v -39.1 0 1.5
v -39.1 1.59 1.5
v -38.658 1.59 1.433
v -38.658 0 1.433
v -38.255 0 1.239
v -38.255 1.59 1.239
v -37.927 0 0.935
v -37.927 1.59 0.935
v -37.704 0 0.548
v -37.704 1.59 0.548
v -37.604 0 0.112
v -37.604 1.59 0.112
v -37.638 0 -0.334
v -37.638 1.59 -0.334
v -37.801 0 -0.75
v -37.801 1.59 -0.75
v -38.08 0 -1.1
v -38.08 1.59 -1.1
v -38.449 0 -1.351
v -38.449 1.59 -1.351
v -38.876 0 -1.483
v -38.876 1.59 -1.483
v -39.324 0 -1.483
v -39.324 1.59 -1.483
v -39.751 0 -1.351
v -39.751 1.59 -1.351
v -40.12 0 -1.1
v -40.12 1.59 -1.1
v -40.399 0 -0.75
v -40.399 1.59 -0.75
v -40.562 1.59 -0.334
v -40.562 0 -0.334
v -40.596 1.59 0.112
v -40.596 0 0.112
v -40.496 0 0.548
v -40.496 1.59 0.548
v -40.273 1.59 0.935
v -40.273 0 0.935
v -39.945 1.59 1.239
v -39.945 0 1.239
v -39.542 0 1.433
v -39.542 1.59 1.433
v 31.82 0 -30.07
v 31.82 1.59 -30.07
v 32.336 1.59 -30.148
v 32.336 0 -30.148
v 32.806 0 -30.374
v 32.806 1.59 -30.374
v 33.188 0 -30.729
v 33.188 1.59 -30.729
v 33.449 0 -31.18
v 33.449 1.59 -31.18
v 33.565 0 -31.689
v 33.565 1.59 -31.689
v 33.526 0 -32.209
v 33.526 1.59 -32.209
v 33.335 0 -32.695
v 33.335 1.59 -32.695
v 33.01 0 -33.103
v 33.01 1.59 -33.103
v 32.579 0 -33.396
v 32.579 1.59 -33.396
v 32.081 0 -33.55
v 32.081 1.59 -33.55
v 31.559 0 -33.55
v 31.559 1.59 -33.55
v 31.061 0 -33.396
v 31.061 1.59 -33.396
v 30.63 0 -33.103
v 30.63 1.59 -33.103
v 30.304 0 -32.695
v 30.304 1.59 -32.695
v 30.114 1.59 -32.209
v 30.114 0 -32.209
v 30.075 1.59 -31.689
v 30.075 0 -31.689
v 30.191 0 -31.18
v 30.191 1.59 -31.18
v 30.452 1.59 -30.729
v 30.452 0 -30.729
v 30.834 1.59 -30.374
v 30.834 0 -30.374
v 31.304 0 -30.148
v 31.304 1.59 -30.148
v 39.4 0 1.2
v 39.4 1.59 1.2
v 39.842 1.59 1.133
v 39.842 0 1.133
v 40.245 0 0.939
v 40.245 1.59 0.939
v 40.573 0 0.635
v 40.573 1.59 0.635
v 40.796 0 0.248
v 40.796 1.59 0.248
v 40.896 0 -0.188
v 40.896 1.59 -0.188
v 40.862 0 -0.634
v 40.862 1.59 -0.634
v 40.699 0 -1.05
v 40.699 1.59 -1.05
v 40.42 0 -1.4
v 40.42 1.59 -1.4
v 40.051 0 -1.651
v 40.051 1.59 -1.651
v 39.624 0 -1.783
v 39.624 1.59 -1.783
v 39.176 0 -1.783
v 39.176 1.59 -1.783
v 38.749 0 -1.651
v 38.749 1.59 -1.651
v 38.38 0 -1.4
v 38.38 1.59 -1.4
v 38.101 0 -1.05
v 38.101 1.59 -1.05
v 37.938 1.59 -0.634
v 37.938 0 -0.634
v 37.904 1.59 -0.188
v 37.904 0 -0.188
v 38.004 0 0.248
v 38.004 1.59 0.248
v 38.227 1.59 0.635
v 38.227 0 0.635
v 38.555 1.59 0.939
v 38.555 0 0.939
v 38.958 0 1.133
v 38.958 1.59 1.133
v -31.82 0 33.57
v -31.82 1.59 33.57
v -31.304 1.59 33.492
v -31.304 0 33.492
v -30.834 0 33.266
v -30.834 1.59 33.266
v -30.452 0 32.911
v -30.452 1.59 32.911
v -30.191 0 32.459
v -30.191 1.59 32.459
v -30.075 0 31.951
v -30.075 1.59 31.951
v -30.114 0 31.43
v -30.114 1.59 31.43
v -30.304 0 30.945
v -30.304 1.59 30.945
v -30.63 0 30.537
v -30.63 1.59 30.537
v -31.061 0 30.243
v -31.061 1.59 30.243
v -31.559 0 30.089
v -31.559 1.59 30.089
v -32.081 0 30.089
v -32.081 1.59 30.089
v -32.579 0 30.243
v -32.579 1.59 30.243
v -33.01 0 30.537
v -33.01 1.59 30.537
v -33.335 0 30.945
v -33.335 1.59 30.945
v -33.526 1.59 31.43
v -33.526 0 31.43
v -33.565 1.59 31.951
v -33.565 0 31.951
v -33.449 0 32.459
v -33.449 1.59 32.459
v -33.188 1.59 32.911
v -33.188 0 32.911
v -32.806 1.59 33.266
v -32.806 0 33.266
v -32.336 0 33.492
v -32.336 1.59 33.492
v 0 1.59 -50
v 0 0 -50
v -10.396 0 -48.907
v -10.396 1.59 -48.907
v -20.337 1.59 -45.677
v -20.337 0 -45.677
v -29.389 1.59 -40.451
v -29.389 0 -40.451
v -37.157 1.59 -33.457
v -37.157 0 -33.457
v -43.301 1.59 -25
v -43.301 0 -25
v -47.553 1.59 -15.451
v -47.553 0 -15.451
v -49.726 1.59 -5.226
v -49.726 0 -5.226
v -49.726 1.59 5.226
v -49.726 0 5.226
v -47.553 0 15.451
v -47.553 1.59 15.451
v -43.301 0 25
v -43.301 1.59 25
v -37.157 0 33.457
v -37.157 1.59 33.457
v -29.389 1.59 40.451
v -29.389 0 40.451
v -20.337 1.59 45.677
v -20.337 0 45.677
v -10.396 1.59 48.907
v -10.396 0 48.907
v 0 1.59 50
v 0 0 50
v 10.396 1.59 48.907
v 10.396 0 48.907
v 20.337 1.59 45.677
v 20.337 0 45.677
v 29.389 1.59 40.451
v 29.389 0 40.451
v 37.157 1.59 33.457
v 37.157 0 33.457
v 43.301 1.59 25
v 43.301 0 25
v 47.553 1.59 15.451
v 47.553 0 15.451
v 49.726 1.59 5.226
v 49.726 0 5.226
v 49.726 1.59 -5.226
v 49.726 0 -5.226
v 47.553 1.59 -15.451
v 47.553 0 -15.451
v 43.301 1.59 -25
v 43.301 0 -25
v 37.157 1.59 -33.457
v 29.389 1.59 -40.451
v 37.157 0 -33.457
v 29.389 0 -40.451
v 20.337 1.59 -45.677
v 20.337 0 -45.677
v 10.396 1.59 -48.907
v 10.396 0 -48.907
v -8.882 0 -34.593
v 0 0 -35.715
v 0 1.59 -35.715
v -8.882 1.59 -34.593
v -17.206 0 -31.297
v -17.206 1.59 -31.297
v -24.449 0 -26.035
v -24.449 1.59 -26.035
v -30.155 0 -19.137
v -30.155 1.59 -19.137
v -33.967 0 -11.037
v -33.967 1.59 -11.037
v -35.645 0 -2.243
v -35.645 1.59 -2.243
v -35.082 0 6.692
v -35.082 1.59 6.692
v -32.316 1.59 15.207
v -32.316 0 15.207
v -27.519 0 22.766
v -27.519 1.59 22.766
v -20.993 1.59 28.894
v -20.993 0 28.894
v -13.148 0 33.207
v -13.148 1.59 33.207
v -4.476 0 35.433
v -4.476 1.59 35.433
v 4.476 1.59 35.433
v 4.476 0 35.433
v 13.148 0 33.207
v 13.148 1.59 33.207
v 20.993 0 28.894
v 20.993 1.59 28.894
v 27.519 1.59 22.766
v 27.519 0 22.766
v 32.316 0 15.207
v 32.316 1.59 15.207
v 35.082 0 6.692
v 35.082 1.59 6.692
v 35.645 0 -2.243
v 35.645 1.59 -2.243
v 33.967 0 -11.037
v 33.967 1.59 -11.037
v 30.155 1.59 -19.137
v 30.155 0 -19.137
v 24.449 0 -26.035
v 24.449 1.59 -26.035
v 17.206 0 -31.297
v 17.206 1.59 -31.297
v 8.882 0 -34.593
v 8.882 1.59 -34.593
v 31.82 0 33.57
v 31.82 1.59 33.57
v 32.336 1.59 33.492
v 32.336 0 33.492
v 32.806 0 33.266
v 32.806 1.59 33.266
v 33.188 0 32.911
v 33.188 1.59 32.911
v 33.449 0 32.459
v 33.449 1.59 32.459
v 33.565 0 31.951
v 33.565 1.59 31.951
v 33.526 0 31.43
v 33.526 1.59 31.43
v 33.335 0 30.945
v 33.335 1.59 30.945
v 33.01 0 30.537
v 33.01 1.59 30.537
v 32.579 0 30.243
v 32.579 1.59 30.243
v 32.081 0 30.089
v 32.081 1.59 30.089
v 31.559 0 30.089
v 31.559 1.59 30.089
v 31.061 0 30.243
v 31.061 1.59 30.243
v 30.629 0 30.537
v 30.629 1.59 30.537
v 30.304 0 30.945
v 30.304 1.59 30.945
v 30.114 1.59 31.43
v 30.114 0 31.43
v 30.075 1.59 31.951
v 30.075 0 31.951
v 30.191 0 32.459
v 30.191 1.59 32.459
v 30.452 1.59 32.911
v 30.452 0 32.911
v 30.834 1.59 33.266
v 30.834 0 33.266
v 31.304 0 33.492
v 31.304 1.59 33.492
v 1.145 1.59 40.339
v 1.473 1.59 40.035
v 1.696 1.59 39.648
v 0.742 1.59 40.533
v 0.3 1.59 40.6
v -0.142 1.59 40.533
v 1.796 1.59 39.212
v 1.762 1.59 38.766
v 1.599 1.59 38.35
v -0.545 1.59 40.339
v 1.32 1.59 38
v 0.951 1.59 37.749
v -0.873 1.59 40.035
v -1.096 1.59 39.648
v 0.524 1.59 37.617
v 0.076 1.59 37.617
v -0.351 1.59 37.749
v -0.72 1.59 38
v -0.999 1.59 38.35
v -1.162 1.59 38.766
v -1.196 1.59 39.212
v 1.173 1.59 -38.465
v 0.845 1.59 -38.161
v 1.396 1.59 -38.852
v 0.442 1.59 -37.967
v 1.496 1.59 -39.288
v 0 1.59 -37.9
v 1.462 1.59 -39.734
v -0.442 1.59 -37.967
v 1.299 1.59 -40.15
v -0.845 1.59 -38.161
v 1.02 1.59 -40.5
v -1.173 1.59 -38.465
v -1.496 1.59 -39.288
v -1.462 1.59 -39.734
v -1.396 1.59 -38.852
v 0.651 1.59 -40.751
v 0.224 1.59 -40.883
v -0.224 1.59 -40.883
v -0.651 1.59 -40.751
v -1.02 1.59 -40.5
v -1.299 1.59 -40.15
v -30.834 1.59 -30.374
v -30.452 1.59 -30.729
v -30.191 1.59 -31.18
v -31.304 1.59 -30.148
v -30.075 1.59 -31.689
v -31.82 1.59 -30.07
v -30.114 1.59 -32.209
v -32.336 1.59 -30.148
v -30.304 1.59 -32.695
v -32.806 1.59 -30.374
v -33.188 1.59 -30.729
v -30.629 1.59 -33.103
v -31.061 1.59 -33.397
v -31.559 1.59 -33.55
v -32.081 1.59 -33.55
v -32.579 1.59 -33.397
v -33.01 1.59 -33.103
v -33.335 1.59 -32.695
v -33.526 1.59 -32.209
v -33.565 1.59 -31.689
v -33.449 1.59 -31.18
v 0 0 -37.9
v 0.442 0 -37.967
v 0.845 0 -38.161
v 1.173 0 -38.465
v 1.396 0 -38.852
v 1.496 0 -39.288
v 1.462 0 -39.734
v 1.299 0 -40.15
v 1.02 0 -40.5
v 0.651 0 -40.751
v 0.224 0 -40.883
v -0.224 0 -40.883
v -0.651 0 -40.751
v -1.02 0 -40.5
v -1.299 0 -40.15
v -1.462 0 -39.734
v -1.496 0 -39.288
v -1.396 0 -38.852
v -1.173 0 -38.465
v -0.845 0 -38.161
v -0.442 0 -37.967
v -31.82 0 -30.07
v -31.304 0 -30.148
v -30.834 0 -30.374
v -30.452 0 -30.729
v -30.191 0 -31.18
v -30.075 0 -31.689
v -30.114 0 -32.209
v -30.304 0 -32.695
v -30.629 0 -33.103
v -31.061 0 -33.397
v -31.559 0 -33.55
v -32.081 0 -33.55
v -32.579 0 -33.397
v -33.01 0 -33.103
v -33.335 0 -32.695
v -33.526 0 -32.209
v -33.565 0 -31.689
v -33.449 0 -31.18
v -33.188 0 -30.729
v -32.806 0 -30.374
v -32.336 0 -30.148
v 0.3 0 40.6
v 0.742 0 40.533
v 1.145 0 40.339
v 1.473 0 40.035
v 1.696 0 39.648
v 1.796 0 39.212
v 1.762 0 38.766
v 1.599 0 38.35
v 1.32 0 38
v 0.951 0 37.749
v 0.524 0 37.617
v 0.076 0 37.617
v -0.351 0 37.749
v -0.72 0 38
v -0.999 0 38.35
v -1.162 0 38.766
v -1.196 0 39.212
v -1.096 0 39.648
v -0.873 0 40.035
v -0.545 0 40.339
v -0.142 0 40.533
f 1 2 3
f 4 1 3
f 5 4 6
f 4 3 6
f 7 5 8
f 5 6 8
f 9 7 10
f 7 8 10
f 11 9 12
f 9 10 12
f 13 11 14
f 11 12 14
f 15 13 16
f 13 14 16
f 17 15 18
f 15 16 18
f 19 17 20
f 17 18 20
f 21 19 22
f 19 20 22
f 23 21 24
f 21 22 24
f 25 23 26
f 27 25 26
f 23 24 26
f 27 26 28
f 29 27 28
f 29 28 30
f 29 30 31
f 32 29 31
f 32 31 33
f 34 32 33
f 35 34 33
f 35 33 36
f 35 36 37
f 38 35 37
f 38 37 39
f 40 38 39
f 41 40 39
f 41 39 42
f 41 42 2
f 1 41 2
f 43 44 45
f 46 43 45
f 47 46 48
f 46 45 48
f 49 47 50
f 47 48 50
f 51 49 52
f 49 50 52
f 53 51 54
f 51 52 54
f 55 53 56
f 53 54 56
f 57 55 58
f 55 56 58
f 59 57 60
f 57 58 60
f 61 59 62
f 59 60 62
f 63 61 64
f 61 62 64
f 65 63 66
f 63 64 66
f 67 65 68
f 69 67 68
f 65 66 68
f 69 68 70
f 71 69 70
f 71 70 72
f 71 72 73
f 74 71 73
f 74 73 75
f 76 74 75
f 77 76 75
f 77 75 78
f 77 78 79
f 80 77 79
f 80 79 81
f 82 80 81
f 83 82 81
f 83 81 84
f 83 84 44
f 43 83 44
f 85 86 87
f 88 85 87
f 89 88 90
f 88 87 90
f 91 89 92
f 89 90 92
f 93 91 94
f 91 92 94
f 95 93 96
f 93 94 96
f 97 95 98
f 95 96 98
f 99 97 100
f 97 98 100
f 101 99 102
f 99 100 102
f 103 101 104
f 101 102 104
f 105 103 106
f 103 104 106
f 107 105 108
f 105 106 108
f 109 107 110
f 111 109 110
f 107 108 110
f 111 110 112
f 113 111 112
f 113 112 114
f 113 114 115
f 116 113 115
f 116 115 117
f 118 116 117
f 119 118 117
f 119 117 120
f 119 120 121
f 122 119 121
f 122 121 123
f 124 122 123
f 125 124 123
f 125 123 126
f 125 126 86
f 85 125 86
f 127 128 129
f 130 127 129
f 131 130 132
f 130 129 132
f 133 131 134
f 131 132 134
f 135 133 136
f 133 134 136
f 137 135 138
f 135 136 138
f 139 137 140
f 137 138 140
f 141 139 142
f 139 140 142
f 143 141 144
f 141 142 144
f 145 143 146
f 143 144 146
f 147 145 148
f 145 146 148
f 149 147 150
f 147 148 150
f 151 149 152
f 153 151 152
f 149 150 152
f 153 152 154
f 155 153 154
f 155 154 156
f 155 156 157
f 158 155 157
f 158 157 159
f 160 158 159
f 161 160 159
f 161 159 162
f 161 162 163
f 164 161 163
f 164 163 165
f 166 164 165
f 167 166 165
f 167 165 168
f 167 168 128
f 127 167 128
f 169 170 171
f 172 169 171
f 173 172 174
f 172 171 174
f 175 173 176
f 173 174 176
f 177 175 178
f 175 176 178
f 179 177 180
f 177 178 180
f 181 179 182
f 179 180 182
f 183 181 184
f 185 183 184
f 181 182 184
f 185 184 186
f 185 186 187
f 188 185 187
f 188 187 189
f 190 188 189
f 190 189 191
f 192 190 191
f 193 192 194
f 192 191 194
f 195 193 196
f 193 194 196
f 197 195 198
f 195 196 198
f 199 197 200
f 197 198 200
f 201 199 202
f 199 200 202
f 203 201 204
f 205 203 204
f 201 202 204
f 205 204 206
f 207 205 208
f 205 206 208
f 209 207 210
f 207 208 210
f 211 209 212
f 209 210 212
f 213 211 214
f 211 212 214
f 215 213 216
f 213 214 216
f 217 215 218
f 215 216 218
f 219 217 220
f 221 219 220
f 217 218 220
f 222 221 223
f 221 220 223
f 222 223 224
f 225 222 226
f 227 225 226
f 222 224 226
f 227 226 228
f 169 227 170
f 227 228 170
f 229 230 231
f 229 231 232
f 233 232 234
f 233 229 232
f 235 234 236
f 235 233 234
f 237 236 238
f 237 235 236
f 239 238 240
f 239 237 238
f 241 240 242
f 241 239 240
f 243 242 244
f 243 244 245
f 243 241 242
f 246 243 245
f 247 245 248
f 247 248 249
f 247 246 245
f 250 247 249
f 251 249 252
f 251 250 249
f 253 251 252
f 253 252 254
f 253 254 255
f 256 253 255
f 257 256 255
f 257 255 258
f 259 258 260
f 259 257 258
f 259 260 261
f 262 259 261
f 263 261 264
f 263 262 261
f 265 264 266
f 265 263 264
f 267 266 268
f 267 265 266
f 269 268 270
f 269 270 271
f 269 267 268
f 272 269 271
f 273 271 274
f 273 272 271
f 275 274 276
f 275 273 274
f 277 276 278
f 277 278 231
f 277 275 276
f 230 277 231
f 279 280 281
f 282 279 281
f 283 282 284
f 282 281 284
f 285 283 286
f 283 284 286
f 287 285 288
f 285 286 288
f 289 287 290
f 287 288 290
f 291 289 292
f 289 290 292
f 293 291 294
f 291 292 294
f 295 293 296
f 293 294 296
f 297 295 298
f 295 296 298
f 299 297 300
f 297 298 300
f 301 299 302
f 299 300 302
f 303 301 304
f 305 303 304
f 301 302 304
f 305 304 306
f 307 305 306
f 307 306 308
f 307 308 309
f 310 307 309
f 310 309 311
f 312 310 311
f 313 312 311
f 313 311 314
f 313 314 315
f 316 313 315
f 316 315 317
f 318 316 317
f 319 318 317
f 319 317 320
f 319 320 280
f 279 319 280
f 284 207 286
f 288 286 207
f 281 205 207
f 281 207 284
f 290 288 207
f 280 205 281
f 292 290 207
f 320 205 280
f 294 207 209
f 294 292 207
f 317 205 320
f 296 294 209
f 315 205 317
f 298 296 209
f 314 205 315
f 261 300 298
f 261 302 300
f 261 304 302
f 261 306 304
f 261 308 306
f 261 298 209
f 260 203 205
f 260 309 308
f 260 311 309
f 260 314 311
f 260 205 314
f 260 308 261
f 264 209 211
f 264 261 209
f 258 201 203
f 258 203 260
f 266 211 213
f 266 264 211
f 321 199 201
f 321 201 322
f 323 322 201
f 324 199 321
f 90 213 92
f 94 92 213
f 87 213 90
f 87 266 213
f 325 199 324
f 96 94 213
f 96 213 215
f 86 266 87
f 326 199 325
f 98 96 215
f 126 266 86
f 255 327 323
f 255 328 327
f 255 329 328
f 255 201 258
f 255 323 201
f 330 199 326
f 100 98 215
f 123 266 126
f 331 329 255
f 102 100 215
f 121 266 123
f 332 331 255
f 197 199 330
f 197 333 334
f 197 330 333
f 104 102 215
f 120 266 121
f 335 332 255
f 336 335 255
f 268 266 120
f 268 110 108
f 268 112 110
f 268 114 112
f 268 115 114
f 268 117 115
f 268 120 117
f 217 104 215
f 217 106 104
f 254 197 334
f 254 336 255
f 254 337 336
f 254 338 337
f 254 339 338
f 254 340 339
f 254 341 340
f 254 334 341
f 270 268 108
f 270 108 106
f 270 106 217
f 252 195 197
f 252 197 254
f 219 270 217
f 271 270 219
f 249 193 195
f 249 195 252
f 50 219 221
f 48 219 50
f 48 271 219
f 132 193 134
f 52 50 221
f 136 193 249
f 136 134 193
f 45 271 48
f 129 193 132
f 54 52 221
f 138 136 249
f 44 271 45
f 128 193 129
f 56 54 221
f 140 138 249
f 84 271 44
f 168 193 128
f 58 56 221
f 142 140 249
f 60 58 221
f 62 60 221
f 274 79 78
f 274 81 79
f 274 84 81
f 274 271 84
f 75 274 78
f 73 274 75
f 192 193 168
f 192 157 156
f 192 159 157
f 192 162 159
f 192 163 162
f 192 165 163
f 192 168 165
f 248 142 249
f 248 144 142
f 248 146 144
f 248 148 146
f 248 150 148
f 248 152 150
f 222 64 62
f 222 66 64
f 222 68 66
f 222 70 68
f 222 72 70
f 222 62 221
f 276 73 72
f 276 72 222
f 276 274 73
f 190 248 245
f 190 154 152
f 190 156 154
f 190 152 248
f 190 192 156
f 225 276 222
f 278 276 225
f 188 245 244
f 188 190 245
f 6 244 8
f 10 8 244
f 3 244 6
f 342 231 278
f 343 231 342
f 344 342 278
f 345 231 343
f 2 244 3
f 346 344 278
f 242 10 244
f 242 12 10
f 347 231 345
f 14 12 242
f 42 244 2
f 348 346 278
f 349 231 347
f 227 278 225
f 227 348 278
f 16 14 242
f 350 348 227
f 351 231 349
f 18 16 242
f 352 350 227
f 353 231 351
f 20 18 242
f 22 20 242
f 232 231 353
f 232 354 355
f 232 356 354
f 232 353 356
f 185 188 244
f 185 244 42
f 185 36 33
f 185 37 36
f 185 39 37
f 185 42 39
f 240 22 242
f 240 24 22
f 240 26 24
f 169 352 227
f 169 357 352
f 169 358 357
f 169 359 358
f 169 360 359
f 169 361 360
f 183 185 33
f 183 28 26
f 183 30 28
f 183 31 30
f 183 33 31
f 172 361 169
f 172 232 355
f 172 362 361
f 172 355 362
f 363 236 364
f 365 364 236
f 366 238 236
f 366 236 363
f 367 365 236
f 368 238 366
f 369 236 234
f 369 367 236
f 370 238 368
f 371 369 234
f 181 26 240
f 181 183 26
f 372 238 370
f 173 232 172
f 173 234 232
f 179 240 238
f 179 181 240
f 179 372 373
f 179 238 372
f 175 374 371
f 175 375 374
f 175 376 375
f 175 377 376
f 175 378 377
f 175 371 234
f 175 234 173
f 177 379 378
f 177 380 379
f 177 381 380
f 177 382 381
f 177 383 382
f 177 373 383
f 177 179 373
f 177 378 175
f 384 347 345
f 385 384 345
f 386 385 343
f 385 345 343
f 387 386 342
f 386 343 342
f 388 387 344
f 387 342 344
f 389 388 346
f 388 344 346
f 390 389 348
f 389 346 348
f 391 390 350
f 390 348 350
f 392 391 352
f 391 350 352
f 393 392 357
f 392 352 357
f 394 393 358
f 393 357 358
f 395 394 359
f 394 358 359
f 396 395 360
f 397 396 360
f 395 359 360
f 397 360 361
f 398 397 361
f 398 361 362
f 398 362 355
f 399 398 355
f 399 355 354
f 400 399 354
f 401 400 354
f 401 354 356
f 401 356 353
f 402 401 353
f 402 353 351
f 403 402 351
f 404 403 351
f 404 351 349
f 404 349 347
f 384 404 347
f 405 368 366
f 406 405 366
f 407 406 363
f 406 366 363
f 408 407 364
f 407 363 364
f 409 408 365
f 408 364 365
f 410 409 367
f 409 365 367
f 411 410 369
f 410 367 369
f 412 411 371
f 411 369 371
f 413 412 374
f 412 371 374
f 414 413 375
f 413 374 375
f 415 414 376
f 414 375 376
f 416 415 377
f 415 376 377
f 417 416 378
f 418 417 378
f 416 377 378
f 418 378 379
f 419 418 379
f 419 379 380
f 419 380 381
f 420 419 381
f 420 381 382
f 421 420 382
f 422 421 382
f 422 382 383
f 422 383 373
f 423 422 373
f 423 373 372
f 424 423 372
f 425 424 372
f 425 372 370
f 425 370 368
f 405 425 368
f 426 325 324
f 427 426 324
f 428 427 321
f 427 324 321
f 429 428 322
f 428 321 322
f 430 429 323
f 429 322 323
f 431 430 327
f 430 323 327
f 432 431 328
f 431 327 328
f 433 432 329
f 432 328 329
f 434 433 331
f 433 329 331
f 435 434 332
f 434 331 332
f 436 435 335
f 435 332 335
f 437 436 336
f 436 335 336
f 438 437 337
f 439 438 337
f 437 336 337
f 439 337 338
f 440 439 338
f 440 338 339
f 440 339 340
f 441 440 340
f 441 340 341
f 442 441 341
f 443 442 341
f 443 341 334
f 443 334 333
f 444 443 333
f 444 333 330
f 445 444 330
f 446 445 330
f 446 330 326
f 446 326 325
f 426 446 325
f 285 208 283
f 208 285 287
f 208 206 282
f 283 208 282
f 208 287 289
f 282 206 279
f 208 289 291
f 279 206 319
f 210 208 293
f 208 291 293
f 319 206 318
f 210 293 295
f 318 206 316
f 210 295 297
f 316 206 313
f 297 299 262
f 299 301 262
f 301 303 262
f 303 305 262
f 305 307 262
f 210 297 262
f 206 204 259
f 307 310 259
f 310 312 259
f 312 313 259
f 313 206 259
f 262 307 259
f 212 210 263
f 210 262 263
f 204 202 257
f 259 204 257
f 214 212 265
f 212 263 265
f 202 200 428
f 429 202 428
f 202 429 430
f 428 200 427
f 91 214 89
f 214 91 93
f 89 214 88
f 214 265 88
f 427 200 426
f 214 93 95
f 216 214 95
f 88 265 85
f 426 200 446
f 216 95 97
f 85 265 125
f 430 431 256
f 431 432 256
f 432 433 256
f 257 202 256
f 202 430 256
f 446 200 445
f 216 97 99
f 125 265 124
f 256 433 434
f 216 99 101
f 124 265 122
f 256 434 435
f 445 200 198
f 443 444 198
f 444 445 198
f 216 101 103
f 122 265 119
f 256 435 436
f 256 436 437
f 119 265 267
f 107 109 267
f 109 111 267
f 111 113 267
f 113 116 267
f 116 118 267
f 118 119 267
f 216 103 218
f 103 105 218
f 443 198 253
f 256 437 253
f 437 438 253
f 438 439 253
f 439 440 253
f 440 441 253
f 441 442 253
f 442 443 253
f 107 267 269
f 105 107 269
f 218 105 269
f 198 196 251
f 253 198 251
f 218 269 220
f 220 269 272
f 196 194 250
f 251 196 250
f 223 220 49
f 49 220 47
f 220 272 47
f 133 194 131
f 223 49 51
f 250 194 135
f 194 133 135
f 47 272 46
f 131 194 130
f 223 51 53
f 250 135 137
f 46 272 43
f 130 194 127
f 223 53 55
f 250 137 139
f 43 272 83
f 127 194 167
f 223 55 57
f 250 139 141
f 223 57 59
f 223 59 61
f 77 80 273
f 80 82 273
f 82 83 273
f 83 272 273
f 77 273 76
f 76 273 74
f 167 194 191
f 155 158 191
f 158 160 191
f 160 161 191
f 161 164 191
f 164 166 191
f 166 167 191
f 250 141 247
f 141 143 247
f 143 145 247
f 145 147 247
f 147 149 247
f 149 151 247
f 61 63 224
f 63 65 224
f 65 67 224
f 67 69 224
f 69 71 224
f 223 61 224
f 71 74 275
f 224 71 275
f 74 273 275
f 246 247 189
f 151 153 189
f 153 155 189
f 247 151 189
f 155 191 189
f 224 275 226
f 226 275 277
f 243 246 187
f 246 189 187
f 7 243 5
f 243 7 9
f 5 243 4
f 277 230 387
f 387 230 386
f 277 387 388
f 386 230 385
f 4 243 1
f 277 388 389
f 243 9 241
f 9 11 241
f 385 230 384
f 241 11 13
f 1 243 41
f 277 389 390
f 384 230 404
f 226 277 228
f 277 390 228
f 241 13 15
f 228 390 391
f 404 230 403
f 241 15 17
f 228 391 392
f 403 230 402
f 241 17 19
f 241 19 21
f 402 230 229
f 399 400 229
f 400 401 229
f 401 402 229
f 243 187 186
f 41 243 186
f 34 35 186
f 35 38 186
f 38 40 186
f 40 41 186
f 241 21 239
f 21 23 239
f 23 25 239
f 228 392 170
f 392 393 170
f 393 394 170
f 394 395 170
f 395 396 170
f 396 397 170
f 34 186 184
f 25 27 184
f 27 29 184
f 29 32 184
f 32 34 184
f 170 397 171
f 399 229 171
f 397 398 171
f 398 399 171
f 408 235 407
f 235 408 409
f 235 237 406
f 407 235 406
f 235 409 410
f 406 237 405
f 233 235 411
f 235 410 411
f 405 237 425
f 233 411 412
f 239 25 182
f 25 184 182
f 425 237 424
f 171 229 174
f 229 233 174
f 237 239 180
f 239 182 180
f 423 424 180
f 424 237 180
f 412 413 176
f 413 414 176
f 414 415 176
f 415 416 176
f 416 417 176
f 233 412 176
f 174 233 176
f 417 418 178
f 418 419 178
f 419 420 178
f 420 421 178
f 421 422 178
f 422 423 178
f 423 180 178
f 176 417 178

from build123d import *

# Parameters (mm, degrees)
SKETCH1_R           = 50
SKETCH1_R_2         = 35.715
BOSS_EXTRUDE1_DEPTH = 1.59
SKETCH2_R           = 1.5
CUT_EXTRUDE1_DEPTH  = 2
SKETCH3_R           = 1.75
CUT_EXTRUDE2_DEPTH  = 2


with BuildPart() as part:
    # Sketch1 → Boss-Extrude1 (new body)
    with BuildSketch(Plane(origin=(0, 0, 0), x_dir=(1, 0, 0), z_dir=(0, 1, 0))):
        with Locations(Location((0, 0, 0), (0, 0, 90))):
            Circle(SKETCH1_R)
        with Locations(Location((0, 0, 0), (0, 0, 90))):
            Circle(SKETCH1_R_2, mode=Mode.SUBTRACT)
    extrude(amount=BOSS_EXTRUDE1_DEPTH)

    # Sketch2 → Cut-Extrude1 (cut)
    with BuildSketch(Plane(origin=(0, 1.59, 0), x_dir=(1, 0, 0), z_dir=(0, 1, 0))):
        with Locations(Location((0, 39.4, 0), (0, 0, 270))):
            Circle(SKETCH2_R)
        with Locations(Location((39.4, 0.3, 0), (0, 0, 270))):
            Circle(SKETCH2_R)
        with Locations(Location((0.3, -39.1, 0), (0, 0, 270))):
            Circle(SKETCH2_R)
        with Locations(Location((-39.1, 0, 0), (0, 0, 270))):
            Circle(SKETCH2_R)
    extrude(amount=-CUT_EXTRUDE1_DEPTH, mode=Mode.SUBTRACT)

    # Sketch3 → Cut-Extrude2 (cut)
    with BuildSketch(Plane(origin=(0, 1.59, 0), x_dir=(1, 0, 0), z_dir=(0, 1, 0))):
        with Locations(Location((-31.8198, 31.819810307, 0), (0, 0, 270))):
            Circle(SKETCH3_R)
        with Locations(Location((31.819810307, 31.8198, 0), (0, 0, 270))):
            Circle(SKETCH3_R)
        with Locations(Location((31.8198, -31.819810307, 0), (0, 0, 270))):
            Circle(SKETCH3_R)
        with Locations(Location((-31.819810307, -31.8198, 0), (0, 0, 270))):
            Circle(SKETCH3_R)
    extrude(amount=-CUT_EXTRUDE2_DEPTH, mode=Mode.SUBTRACT)


solid = part.part
